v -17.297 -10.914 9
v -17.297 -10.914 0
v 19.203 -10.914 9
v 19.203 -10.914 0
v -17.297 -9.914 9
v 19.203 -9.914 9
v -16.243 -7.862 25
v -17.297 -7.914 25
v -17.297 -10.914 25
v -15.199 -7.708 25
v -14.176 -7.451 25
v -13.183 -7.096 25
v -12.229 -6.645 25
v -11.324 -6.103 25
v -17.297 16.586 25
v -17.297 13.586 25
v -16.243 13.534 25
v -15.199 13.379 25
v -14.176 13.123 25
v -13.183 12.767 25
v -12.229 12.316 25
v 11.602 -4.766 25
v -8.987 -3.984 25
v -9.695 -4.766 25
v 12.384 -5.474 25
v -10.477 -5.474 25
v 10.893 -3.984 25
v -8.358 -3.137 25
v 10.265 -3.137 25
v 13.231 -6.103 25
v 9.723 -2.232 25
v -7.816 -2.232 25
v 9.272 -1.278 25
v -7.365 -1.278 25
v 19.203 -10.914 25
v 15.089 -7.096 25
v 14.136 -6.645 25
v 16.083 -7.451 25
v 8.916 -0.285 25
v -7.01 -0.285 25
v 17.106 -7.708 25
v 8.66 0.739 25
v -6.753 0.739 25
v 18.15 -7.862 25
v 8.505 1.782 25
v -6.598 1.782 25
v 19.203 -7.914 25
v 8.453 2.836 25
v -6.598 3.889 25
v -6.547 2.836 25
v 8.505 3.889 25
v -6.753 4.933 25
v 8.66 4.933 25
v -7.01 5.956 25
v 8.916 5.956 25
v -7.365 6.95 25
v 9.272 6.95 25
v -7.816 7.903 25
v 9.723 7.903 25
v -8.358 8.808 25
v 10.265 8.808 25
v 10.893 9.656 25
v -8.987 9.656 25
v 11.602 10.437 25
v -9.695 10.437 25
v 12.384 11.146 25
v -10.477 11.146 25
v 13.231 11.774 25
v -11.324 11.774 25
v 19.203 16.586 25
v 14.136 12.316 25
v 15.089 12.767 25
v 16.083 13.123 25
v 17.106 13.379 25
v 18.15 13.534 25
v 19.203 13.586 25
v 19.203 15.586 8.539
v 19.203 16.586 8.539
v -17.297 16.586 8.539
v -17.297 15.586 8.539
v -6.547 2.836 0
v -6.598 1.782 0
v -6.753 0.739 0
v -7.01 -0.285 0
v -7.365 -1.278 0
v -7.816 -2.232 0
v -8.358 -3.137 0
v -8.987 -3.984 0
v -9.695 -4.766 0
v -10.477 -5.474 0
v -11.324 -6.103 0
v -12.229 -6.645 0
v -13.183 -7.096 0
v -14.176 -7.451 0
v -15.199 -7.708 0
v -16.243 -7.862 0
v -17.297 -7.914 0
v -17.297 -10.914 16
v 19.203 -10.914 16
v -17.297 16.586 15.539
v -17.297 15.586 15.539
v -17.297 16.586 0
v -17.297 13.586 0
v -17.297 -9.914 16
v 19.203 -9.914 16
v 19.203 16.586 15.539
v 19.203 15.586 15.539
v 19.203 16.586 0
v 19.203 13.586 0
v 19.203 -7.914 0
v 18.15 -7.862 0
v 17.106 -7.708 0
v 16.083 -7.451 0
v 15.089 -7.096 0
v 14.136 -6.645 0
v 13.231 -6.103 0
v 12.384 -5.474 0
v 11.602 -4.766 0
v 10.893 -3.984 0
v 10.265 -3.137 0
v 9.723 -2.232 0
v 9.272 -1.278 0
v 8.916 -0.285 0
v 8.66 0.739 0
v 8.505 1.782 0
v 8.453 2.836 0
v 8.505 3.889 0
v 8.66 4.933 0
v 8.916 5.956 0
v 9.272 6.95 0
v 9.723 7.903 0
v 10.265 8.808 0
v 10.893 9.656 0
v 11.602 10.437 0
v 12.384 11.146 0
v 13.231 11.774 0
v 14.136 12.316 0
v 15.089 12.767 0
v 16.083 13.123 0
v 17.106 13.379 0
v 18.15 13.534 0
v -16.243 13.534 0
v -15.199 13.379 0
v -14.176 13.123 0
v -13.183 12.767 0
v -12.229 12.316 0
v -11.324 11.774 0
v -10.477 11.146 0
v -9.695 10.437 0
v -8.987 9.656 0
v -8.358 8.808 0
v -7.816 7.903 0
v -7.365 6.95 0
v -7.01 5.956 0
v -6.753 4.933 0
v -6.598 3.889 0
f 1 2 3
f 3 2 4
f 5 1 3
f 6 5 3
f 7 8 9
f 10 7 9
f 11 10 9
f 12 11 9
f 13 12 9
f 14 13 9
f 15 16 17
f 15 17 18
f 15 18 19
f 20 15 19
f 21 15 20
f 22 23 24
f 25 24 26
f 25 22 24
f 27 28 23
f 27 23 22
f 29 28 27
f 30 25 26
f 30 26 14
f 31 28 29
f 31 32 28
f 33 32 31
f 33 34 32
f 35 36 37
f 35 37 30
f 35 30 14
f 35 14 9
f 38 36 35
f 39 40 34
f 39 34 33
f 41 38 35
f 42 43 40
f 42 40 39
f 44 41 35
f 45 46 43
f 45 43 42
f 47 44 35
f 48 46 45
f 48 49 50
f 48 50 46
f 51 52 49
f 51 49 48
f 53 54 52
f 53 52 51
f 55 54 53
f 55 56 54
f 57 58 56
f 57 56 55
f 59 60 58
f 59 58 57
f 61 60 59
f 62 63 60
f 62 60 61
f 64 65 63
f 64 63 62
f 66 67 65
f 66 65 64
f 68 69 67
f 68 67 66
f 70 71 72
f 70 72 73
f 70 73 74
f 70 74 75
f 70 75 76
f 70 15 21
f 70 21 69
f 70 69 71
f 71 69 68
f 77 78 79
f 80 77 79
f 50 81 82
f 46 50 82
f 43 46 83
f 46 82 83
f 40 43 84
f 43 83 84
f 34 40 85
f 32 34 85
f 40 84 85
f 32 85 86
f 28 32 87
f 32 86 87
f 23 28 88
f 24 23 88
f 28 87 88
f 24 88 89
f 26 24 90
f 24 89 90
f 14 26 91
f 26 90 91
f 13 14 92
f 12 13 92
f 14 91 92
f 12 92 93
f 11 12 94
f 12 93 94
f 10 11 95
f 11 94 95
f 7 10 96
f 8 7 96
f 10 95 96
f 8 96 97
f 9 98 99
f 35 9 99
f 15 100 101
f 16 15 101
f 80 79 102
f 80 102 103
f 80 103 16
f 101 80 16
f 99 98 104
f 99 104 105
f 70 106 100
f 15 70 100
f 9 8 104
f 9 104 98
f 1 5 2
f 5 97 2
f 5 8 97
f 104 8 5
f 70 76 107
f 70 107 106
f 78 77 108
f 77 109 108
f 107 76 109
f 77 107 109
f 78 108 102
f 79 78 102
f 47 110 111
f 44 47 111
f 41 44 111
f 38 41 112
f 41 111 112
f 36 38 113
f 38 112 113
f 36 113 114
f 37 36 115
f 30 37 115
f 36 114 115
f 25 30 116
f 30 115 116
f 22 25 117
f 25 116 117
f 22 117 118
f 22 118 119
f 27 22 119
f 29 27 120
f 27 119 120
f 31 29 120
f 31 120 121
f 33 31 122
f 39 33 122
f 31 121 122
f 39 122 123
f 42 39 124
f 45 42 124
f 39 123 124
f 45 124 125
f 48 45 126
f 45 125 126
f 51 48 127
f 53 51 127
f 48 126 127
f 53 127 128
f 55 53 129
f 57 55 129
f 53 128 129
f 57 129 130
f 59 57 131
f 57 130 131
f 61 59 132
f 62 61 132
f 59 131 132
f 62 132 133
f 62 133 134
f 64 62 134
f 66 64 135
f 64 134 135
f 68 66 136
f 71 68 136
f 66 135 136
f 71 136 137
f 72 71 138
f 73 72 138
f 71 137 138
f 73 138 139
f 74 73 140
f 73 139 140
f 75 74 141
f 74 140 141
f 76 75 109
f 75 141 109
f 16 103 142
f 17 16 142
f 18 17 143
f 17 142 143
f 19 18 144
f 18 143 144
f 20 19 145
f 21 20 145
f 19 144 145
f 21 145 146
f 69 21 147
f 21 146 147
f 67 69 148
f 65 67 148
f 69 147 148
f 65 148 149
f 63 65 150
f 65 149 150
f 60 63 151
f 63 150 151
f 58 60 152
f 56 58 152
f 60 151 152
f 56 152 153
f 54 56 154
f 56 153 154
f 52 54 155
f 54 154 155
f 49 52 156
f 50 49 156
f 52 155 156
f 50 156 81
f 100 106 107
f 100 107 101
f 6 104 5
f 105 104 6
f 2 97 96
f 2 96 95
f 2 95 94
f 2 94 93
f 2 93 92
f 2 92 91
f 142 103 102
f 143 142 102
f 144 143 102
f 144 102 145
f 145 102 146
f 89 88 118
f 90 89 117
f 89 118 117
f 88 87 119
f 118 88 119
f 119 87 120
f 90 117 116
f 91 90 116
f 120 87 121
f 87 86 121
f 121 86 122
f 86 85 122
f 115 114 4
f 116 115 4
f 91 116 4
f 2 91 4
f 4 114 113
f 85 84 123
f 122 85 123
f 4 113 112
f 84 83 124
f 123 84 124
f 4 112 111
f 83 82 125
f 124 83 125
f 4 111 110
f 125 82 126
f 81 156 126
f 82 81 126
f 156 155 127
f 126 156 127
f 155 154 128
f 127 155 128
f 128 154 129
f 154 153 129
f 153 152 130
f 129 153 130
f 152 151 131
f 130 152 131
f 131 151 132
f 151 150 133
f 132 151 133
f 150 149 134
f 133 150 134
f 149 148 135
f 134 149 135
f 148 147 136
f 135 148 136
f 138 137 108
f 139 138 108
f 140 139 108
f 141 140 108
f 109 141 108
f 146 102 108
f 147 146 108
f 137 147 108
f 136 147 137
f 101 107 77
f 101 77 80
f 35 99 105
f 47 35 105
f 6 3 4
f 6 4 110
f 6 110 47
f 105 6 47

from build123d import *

# Parameters (mm, degrees)
F1_DEPTH = 25
F2_W     = 36.5
F2_H     = 7
F3_DEPTH = 1
F4_W     = 36.5
F4_H     = 7
F5_DEPTH = 1


with BuildPart() as f1:
    # F0 (on Top) → F1 (new body)
    with BuildSketch(Plane.XY):
        with BuildLine():
            ThreePointArc((19.203308, -7.914208), (8.453308, 2.835792), (19.203308, 13.585792))
            Line((19.203308, 13.585792), (19.203308, 16.585792))
            Line((19.203308, 16.585792), (-17.296692, 16.585792))
            Line((-17.296692, 16.585792), (-17.296692, 13.585792))
            ThreePointArc((-17.296692, 13.585792), (-9.695294, 10.43719), (-6.546692, 2.835792))
            ThreePointArc((-6.546692, 2.835792), (-9.695294, -4.765606), (-17.296692, -7.914208))
            Line((-17.296692, -7.914208), (-17.296692, -10.914208))
            Line((-17.296692, -10.914208), (19.203308, -10.914208))
            Line((19.203308, -10.914208), (19.203308, -7.914208))
        make_face()
    extrude(amount=F1_DEPTH)

    # F2 (on face) → F3 (cut)
    with BuildSketch(Plane.XZ.offset(10.914208)):
        with Locations((0.953308, 12.5)):
            Rectangle(F2_W, F2_H)
    extrude(amount=-F3_DEPTH, mode=Mode.SUBTRACT)

    # F4 (on face) → F5 (cut)
    with BuildSketch(Plane(origin=(0, 16.585792, 0), x_dir=(-1, 0, 0), z_dir=(0, 1, 0))):
        with Locations((-0.953308, 12.039038)):
            Rectangle(F4_W, F4_H)
    extrude(amount=-F5_DEPTH, mode=Mode.SUBTRACT)


solid = f1.part
